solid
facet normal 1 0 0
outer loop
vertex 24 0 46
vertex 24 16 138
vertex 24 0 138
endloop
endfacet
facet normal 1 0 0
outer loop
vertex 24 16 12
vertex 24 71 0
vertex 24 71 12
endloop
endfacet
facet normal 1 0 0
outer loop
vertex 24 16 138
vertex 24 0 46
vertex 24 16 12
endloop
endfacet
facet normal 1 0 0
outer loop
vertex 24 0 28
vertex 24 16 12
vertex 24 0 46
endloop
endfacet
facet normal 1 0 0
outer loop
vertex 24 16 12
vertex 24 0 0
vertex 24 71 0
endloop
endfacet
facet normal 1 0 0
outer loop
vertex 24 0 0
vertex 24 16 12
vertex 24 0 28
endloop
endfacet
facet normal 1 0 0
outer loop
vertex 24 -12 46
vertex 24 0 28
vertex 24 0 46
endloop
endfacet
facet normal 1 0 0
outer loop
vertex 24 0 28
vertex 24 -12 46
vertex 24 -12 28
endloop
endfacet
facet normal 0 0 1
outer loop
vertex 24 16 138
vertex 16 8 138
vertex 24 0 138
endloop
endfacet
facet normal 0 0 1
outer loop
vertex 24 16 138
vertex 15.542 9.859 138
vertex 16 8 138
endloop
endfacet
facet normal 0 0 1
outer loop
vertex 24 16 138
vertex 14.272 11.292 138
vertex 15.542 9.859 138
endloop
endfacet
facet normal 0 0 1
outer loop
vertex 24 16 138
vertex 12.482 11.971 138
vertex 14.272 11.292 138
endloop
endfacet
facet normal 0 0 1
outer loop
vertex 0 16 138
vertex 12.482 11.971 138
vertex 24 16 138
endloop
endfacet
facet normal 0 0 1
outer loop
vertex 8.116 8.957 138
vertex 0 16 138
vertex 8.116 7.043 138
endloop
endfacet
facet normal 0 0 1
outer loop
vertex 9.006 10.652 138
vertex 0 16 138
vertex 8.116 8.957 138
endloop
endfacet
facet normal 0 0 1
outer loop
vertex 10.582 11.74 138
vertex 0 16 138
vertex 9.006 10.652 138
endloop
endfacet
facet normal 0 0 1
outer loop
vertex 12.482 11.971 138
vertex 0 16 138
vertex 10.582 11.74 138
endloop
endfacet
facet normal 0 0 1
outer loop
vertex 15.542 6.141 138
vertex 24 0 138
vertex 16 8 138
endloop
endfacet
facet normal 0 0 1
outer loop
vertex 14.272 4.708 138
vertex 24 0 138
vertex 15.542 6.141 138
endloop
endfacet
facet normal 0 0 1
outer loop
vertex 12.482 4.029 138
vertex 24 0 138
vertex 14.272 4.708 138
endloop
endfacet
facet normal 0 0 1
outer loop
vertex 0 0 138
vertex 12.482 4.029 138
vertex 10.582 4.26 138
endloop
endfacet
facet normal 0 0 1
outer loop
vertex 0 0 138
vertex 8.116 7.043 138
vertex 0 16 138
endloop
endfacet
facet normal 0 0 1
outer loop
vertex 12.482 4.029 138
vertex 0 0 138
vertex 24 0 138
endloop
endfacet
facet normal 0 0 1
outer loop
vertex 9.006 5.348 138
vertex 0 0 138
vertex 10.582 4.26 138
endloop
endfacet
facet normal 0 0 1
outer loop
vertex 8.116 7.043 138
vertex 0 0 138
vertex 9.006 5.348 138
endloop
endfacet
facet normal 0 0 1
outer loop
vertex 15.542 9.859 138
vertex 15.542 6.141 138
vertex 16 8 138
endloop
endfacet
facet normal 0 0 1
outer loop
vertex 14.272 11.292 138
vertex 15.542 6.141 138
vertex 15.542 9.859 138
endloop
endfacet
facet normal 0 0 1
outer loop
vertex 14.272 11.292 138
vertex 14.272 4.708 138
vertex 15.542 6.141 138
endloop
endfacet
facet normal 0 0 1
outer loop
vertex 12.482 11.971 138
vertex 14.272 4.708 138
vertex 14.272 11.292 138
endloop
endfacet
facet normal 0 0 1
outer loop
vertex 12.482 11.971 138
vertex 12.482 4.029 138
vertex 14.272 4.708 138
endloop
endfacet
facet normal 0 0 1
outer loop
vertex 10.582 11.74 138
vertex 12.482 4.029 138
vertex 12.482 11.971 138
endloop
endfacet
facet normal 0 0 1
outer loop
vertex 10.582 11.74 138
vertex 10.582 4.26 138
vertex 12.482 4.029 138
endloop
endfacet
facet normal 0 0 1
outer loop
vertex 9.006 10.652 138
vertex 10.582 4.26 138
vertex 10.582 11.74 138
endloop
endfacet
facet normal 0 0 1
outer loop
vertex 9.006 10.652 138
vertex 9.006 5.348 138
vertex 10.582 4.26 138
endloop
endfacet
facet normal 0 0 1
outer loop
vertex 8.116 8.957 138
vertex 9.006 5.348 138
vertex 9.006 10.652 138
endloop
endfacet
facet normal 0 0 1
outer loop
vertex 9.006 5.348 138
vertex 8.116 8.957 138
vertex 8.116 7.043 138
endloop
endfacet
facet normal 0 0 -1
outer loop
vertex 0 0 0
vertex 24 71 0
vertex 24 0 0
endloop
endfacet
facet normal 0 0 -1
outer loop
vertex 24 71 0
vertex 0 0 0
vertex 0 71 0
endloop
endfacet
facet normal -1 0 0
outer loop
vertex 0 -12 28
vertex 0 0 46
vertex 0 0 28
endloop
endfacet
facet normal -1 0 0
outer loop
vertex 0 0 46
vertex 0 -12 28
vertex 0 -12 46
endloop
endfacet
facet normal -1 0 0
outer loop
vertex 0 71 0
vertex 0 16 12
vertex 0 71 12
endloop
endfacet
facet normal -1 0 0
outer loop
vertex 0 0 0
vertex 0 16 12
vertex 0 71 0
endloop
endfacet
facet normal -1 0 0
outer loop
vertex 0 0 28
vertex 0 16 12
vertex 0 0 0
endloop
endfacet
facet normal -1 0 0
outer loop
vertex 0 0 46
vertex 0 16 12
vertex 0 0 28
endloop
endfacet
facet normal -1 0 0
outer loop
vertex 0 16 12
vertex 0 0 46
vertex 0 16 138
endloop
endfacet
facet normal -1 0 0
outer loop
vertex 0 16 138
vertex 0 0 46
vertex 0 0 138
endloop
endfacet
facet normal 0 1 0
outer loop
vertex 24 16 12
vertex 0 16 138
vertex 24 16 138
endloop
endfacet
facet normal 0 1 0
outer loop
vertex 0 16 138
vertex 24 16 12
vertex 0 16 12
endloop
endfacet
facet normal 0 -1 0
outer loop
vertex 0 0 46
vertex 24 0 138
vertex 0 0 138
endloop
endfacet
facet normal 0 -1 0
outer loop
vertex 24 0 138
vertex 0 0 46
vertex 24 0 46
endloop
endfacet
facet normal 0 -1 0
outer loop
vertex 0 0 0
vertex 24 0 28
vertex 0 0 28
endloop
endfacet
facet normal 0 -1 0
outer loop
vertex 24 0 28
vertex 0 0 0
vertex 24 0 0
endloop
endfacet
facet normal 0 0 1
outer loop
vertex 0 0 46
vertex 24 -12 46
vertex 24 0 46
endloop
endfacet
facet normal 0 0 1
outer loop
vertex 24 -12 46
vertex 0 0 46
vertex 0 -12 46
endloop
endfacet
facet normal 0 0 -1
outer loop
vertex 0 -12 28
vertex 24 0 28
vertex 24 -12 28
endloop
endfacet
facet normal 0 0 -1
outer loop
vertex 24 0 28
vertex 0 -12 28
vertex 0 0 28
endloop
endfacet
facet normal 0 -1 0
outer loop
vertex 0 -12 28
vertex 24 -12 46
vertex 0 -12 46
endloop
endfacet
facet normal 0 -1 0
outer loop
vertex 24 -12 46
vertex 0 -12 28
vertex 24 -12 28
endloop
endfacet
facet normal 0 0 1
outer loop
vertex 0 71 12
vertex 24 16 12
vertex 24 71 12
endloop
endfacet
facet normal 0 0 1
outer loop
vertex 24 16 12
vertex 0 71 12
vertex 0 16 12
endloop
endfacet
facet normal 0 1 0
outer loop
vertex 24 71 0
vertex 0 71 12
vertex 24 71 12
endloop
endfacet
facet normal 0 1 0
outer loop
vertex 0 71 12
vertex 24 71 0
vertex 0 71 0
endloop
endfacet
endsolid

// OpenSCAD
difference() {
    cube(
        [24, 16, 138],
        false
    );
    translate([12, 8, 138])
        cylinder(8, 4, 4, false);

}


translate([0, -12, 28])
    cube(
        [24, 12, 18],
        false
    );

translate([0, 16, 0])
    cube(
        [24, 55, 12],
        false
    );
    
